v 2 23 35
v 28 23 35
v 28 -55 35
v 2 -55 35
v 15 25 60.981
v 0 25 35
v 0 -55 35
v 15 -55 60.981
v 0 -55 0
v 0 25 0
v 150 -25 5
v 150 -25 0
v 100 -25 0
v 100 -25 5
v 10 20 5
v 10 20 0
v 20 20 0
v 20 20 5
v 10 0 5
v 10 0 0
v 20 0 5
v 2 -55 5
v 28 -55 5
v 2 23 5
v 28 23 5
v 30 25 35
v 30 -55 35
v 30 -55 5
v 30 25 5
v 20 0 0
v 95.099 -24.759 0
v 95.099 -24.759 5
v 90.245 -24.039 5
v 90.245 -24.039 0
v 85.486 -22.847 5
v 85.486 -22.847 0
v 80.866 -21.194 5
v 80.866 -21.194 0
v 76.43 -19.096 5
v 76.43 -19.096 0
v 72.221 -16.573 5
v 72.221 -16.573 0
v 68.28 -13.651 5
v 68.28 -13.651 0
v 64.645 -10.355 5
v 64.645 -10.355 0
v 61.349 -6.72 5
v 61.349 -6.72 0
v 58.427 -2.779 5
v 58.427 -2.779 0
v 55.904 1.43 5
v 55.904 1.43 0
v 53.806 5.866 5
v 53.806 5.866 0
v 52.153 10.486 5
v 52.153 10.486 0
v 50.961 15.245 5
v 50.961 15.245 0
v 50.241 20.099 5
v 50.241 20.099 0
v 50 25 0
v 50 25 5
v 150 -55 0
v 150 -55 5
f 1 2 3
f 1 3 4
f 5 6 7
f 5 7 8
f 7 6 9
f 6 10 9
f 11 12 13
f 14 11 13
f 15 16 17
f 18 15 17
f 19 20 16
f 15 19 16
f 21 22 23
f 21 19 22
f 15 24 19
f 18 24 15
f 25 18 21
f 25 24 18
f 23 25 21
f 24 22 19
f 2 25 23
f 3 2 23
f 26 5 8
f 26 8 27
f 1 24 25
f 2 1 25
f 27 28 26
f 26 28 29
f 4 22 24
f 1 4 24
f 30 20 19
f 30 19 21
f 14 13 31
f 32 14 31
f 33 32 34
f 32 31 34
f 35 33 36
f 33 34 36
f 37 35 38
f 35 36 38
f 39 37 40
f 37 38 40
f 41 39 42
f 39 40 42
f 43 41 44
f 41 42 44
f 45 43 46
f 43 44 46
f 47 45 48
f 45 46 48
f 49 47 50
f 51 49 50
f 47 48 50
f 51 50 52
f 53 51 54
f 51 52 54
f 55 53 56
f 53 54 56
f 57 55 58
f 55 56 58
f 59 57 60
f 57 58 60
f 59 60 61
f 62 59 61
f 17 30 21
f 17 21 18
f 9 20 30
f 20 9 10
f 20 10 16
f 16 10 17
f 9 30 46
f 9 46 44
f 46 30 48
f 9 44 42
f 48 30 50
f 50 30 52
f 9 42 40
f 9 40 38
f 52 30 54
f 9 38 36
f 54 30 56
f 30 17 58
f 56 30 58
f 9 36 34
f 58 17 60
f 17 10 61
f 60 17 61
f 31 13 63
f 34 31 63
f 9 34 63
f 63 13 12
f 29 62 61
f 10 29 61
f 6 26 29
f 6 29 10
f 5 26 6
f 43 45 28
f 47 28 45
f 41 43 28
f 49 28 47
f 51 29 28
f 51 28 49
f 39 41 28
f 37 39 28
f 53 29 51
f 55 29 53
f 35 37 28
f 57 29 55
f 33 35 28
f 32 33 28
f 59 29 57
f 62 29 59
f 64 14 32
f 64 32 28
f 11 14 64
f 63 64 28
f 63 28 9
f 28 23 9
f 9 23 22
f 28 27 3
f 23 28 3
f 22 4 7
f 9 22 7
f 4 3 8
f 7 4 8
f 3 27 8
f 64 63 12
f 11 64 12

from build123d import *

# Parameters (mm, degrees)
F0_W     = 10
F0_H     = 20
F1_DEPTH = 5
F3_DEPTH = 30
F5_DEPTH = 80


with BuildPart() as f1:
    # F0 (on Top) → F1 (new body)
    with BuildSketch(Plane.XY):
        with BuildLine():
            Line((150, -25), (100, -25))
            ThreePointArc((100, -25), (64.644661, -10.355339), (50, 25))
            Line((50, 25), (0, 25))
            Line((0, 25), (0, -55))
            Line((0, -55), (150, -55))
            Line((150, -55), (150, -25))
        make_face()
        with Locations((15, 10)):
            Rectangle(F0_W, F0_H, mode=Mode.SUBTRACT)
    extrude(amount=F1_DEPTH)

    # F2 (on face) → F3 (join)
    with BuildSketch(Plane.XY.offset(5)):
        Polygon((30, 25), (0, 25), (0, -55), (2, -55), (2, 23), (28, 23), (28, -55), (30, -55), align=None)
    extrude(amount=F3_DEPTH)

    # F4 (on face) → F5 (join, through all)
    with BuildSketch(Plane(origin=(0, 25, 0), x_dir=(-1, 0, 0), z_dir=(0, 1, 0))):
        Polygon((-15, 60.980762), (-30, 35), (0, 35), align=None)
    extrude(amount=-F5_DEPTH)


solid = f1.part
